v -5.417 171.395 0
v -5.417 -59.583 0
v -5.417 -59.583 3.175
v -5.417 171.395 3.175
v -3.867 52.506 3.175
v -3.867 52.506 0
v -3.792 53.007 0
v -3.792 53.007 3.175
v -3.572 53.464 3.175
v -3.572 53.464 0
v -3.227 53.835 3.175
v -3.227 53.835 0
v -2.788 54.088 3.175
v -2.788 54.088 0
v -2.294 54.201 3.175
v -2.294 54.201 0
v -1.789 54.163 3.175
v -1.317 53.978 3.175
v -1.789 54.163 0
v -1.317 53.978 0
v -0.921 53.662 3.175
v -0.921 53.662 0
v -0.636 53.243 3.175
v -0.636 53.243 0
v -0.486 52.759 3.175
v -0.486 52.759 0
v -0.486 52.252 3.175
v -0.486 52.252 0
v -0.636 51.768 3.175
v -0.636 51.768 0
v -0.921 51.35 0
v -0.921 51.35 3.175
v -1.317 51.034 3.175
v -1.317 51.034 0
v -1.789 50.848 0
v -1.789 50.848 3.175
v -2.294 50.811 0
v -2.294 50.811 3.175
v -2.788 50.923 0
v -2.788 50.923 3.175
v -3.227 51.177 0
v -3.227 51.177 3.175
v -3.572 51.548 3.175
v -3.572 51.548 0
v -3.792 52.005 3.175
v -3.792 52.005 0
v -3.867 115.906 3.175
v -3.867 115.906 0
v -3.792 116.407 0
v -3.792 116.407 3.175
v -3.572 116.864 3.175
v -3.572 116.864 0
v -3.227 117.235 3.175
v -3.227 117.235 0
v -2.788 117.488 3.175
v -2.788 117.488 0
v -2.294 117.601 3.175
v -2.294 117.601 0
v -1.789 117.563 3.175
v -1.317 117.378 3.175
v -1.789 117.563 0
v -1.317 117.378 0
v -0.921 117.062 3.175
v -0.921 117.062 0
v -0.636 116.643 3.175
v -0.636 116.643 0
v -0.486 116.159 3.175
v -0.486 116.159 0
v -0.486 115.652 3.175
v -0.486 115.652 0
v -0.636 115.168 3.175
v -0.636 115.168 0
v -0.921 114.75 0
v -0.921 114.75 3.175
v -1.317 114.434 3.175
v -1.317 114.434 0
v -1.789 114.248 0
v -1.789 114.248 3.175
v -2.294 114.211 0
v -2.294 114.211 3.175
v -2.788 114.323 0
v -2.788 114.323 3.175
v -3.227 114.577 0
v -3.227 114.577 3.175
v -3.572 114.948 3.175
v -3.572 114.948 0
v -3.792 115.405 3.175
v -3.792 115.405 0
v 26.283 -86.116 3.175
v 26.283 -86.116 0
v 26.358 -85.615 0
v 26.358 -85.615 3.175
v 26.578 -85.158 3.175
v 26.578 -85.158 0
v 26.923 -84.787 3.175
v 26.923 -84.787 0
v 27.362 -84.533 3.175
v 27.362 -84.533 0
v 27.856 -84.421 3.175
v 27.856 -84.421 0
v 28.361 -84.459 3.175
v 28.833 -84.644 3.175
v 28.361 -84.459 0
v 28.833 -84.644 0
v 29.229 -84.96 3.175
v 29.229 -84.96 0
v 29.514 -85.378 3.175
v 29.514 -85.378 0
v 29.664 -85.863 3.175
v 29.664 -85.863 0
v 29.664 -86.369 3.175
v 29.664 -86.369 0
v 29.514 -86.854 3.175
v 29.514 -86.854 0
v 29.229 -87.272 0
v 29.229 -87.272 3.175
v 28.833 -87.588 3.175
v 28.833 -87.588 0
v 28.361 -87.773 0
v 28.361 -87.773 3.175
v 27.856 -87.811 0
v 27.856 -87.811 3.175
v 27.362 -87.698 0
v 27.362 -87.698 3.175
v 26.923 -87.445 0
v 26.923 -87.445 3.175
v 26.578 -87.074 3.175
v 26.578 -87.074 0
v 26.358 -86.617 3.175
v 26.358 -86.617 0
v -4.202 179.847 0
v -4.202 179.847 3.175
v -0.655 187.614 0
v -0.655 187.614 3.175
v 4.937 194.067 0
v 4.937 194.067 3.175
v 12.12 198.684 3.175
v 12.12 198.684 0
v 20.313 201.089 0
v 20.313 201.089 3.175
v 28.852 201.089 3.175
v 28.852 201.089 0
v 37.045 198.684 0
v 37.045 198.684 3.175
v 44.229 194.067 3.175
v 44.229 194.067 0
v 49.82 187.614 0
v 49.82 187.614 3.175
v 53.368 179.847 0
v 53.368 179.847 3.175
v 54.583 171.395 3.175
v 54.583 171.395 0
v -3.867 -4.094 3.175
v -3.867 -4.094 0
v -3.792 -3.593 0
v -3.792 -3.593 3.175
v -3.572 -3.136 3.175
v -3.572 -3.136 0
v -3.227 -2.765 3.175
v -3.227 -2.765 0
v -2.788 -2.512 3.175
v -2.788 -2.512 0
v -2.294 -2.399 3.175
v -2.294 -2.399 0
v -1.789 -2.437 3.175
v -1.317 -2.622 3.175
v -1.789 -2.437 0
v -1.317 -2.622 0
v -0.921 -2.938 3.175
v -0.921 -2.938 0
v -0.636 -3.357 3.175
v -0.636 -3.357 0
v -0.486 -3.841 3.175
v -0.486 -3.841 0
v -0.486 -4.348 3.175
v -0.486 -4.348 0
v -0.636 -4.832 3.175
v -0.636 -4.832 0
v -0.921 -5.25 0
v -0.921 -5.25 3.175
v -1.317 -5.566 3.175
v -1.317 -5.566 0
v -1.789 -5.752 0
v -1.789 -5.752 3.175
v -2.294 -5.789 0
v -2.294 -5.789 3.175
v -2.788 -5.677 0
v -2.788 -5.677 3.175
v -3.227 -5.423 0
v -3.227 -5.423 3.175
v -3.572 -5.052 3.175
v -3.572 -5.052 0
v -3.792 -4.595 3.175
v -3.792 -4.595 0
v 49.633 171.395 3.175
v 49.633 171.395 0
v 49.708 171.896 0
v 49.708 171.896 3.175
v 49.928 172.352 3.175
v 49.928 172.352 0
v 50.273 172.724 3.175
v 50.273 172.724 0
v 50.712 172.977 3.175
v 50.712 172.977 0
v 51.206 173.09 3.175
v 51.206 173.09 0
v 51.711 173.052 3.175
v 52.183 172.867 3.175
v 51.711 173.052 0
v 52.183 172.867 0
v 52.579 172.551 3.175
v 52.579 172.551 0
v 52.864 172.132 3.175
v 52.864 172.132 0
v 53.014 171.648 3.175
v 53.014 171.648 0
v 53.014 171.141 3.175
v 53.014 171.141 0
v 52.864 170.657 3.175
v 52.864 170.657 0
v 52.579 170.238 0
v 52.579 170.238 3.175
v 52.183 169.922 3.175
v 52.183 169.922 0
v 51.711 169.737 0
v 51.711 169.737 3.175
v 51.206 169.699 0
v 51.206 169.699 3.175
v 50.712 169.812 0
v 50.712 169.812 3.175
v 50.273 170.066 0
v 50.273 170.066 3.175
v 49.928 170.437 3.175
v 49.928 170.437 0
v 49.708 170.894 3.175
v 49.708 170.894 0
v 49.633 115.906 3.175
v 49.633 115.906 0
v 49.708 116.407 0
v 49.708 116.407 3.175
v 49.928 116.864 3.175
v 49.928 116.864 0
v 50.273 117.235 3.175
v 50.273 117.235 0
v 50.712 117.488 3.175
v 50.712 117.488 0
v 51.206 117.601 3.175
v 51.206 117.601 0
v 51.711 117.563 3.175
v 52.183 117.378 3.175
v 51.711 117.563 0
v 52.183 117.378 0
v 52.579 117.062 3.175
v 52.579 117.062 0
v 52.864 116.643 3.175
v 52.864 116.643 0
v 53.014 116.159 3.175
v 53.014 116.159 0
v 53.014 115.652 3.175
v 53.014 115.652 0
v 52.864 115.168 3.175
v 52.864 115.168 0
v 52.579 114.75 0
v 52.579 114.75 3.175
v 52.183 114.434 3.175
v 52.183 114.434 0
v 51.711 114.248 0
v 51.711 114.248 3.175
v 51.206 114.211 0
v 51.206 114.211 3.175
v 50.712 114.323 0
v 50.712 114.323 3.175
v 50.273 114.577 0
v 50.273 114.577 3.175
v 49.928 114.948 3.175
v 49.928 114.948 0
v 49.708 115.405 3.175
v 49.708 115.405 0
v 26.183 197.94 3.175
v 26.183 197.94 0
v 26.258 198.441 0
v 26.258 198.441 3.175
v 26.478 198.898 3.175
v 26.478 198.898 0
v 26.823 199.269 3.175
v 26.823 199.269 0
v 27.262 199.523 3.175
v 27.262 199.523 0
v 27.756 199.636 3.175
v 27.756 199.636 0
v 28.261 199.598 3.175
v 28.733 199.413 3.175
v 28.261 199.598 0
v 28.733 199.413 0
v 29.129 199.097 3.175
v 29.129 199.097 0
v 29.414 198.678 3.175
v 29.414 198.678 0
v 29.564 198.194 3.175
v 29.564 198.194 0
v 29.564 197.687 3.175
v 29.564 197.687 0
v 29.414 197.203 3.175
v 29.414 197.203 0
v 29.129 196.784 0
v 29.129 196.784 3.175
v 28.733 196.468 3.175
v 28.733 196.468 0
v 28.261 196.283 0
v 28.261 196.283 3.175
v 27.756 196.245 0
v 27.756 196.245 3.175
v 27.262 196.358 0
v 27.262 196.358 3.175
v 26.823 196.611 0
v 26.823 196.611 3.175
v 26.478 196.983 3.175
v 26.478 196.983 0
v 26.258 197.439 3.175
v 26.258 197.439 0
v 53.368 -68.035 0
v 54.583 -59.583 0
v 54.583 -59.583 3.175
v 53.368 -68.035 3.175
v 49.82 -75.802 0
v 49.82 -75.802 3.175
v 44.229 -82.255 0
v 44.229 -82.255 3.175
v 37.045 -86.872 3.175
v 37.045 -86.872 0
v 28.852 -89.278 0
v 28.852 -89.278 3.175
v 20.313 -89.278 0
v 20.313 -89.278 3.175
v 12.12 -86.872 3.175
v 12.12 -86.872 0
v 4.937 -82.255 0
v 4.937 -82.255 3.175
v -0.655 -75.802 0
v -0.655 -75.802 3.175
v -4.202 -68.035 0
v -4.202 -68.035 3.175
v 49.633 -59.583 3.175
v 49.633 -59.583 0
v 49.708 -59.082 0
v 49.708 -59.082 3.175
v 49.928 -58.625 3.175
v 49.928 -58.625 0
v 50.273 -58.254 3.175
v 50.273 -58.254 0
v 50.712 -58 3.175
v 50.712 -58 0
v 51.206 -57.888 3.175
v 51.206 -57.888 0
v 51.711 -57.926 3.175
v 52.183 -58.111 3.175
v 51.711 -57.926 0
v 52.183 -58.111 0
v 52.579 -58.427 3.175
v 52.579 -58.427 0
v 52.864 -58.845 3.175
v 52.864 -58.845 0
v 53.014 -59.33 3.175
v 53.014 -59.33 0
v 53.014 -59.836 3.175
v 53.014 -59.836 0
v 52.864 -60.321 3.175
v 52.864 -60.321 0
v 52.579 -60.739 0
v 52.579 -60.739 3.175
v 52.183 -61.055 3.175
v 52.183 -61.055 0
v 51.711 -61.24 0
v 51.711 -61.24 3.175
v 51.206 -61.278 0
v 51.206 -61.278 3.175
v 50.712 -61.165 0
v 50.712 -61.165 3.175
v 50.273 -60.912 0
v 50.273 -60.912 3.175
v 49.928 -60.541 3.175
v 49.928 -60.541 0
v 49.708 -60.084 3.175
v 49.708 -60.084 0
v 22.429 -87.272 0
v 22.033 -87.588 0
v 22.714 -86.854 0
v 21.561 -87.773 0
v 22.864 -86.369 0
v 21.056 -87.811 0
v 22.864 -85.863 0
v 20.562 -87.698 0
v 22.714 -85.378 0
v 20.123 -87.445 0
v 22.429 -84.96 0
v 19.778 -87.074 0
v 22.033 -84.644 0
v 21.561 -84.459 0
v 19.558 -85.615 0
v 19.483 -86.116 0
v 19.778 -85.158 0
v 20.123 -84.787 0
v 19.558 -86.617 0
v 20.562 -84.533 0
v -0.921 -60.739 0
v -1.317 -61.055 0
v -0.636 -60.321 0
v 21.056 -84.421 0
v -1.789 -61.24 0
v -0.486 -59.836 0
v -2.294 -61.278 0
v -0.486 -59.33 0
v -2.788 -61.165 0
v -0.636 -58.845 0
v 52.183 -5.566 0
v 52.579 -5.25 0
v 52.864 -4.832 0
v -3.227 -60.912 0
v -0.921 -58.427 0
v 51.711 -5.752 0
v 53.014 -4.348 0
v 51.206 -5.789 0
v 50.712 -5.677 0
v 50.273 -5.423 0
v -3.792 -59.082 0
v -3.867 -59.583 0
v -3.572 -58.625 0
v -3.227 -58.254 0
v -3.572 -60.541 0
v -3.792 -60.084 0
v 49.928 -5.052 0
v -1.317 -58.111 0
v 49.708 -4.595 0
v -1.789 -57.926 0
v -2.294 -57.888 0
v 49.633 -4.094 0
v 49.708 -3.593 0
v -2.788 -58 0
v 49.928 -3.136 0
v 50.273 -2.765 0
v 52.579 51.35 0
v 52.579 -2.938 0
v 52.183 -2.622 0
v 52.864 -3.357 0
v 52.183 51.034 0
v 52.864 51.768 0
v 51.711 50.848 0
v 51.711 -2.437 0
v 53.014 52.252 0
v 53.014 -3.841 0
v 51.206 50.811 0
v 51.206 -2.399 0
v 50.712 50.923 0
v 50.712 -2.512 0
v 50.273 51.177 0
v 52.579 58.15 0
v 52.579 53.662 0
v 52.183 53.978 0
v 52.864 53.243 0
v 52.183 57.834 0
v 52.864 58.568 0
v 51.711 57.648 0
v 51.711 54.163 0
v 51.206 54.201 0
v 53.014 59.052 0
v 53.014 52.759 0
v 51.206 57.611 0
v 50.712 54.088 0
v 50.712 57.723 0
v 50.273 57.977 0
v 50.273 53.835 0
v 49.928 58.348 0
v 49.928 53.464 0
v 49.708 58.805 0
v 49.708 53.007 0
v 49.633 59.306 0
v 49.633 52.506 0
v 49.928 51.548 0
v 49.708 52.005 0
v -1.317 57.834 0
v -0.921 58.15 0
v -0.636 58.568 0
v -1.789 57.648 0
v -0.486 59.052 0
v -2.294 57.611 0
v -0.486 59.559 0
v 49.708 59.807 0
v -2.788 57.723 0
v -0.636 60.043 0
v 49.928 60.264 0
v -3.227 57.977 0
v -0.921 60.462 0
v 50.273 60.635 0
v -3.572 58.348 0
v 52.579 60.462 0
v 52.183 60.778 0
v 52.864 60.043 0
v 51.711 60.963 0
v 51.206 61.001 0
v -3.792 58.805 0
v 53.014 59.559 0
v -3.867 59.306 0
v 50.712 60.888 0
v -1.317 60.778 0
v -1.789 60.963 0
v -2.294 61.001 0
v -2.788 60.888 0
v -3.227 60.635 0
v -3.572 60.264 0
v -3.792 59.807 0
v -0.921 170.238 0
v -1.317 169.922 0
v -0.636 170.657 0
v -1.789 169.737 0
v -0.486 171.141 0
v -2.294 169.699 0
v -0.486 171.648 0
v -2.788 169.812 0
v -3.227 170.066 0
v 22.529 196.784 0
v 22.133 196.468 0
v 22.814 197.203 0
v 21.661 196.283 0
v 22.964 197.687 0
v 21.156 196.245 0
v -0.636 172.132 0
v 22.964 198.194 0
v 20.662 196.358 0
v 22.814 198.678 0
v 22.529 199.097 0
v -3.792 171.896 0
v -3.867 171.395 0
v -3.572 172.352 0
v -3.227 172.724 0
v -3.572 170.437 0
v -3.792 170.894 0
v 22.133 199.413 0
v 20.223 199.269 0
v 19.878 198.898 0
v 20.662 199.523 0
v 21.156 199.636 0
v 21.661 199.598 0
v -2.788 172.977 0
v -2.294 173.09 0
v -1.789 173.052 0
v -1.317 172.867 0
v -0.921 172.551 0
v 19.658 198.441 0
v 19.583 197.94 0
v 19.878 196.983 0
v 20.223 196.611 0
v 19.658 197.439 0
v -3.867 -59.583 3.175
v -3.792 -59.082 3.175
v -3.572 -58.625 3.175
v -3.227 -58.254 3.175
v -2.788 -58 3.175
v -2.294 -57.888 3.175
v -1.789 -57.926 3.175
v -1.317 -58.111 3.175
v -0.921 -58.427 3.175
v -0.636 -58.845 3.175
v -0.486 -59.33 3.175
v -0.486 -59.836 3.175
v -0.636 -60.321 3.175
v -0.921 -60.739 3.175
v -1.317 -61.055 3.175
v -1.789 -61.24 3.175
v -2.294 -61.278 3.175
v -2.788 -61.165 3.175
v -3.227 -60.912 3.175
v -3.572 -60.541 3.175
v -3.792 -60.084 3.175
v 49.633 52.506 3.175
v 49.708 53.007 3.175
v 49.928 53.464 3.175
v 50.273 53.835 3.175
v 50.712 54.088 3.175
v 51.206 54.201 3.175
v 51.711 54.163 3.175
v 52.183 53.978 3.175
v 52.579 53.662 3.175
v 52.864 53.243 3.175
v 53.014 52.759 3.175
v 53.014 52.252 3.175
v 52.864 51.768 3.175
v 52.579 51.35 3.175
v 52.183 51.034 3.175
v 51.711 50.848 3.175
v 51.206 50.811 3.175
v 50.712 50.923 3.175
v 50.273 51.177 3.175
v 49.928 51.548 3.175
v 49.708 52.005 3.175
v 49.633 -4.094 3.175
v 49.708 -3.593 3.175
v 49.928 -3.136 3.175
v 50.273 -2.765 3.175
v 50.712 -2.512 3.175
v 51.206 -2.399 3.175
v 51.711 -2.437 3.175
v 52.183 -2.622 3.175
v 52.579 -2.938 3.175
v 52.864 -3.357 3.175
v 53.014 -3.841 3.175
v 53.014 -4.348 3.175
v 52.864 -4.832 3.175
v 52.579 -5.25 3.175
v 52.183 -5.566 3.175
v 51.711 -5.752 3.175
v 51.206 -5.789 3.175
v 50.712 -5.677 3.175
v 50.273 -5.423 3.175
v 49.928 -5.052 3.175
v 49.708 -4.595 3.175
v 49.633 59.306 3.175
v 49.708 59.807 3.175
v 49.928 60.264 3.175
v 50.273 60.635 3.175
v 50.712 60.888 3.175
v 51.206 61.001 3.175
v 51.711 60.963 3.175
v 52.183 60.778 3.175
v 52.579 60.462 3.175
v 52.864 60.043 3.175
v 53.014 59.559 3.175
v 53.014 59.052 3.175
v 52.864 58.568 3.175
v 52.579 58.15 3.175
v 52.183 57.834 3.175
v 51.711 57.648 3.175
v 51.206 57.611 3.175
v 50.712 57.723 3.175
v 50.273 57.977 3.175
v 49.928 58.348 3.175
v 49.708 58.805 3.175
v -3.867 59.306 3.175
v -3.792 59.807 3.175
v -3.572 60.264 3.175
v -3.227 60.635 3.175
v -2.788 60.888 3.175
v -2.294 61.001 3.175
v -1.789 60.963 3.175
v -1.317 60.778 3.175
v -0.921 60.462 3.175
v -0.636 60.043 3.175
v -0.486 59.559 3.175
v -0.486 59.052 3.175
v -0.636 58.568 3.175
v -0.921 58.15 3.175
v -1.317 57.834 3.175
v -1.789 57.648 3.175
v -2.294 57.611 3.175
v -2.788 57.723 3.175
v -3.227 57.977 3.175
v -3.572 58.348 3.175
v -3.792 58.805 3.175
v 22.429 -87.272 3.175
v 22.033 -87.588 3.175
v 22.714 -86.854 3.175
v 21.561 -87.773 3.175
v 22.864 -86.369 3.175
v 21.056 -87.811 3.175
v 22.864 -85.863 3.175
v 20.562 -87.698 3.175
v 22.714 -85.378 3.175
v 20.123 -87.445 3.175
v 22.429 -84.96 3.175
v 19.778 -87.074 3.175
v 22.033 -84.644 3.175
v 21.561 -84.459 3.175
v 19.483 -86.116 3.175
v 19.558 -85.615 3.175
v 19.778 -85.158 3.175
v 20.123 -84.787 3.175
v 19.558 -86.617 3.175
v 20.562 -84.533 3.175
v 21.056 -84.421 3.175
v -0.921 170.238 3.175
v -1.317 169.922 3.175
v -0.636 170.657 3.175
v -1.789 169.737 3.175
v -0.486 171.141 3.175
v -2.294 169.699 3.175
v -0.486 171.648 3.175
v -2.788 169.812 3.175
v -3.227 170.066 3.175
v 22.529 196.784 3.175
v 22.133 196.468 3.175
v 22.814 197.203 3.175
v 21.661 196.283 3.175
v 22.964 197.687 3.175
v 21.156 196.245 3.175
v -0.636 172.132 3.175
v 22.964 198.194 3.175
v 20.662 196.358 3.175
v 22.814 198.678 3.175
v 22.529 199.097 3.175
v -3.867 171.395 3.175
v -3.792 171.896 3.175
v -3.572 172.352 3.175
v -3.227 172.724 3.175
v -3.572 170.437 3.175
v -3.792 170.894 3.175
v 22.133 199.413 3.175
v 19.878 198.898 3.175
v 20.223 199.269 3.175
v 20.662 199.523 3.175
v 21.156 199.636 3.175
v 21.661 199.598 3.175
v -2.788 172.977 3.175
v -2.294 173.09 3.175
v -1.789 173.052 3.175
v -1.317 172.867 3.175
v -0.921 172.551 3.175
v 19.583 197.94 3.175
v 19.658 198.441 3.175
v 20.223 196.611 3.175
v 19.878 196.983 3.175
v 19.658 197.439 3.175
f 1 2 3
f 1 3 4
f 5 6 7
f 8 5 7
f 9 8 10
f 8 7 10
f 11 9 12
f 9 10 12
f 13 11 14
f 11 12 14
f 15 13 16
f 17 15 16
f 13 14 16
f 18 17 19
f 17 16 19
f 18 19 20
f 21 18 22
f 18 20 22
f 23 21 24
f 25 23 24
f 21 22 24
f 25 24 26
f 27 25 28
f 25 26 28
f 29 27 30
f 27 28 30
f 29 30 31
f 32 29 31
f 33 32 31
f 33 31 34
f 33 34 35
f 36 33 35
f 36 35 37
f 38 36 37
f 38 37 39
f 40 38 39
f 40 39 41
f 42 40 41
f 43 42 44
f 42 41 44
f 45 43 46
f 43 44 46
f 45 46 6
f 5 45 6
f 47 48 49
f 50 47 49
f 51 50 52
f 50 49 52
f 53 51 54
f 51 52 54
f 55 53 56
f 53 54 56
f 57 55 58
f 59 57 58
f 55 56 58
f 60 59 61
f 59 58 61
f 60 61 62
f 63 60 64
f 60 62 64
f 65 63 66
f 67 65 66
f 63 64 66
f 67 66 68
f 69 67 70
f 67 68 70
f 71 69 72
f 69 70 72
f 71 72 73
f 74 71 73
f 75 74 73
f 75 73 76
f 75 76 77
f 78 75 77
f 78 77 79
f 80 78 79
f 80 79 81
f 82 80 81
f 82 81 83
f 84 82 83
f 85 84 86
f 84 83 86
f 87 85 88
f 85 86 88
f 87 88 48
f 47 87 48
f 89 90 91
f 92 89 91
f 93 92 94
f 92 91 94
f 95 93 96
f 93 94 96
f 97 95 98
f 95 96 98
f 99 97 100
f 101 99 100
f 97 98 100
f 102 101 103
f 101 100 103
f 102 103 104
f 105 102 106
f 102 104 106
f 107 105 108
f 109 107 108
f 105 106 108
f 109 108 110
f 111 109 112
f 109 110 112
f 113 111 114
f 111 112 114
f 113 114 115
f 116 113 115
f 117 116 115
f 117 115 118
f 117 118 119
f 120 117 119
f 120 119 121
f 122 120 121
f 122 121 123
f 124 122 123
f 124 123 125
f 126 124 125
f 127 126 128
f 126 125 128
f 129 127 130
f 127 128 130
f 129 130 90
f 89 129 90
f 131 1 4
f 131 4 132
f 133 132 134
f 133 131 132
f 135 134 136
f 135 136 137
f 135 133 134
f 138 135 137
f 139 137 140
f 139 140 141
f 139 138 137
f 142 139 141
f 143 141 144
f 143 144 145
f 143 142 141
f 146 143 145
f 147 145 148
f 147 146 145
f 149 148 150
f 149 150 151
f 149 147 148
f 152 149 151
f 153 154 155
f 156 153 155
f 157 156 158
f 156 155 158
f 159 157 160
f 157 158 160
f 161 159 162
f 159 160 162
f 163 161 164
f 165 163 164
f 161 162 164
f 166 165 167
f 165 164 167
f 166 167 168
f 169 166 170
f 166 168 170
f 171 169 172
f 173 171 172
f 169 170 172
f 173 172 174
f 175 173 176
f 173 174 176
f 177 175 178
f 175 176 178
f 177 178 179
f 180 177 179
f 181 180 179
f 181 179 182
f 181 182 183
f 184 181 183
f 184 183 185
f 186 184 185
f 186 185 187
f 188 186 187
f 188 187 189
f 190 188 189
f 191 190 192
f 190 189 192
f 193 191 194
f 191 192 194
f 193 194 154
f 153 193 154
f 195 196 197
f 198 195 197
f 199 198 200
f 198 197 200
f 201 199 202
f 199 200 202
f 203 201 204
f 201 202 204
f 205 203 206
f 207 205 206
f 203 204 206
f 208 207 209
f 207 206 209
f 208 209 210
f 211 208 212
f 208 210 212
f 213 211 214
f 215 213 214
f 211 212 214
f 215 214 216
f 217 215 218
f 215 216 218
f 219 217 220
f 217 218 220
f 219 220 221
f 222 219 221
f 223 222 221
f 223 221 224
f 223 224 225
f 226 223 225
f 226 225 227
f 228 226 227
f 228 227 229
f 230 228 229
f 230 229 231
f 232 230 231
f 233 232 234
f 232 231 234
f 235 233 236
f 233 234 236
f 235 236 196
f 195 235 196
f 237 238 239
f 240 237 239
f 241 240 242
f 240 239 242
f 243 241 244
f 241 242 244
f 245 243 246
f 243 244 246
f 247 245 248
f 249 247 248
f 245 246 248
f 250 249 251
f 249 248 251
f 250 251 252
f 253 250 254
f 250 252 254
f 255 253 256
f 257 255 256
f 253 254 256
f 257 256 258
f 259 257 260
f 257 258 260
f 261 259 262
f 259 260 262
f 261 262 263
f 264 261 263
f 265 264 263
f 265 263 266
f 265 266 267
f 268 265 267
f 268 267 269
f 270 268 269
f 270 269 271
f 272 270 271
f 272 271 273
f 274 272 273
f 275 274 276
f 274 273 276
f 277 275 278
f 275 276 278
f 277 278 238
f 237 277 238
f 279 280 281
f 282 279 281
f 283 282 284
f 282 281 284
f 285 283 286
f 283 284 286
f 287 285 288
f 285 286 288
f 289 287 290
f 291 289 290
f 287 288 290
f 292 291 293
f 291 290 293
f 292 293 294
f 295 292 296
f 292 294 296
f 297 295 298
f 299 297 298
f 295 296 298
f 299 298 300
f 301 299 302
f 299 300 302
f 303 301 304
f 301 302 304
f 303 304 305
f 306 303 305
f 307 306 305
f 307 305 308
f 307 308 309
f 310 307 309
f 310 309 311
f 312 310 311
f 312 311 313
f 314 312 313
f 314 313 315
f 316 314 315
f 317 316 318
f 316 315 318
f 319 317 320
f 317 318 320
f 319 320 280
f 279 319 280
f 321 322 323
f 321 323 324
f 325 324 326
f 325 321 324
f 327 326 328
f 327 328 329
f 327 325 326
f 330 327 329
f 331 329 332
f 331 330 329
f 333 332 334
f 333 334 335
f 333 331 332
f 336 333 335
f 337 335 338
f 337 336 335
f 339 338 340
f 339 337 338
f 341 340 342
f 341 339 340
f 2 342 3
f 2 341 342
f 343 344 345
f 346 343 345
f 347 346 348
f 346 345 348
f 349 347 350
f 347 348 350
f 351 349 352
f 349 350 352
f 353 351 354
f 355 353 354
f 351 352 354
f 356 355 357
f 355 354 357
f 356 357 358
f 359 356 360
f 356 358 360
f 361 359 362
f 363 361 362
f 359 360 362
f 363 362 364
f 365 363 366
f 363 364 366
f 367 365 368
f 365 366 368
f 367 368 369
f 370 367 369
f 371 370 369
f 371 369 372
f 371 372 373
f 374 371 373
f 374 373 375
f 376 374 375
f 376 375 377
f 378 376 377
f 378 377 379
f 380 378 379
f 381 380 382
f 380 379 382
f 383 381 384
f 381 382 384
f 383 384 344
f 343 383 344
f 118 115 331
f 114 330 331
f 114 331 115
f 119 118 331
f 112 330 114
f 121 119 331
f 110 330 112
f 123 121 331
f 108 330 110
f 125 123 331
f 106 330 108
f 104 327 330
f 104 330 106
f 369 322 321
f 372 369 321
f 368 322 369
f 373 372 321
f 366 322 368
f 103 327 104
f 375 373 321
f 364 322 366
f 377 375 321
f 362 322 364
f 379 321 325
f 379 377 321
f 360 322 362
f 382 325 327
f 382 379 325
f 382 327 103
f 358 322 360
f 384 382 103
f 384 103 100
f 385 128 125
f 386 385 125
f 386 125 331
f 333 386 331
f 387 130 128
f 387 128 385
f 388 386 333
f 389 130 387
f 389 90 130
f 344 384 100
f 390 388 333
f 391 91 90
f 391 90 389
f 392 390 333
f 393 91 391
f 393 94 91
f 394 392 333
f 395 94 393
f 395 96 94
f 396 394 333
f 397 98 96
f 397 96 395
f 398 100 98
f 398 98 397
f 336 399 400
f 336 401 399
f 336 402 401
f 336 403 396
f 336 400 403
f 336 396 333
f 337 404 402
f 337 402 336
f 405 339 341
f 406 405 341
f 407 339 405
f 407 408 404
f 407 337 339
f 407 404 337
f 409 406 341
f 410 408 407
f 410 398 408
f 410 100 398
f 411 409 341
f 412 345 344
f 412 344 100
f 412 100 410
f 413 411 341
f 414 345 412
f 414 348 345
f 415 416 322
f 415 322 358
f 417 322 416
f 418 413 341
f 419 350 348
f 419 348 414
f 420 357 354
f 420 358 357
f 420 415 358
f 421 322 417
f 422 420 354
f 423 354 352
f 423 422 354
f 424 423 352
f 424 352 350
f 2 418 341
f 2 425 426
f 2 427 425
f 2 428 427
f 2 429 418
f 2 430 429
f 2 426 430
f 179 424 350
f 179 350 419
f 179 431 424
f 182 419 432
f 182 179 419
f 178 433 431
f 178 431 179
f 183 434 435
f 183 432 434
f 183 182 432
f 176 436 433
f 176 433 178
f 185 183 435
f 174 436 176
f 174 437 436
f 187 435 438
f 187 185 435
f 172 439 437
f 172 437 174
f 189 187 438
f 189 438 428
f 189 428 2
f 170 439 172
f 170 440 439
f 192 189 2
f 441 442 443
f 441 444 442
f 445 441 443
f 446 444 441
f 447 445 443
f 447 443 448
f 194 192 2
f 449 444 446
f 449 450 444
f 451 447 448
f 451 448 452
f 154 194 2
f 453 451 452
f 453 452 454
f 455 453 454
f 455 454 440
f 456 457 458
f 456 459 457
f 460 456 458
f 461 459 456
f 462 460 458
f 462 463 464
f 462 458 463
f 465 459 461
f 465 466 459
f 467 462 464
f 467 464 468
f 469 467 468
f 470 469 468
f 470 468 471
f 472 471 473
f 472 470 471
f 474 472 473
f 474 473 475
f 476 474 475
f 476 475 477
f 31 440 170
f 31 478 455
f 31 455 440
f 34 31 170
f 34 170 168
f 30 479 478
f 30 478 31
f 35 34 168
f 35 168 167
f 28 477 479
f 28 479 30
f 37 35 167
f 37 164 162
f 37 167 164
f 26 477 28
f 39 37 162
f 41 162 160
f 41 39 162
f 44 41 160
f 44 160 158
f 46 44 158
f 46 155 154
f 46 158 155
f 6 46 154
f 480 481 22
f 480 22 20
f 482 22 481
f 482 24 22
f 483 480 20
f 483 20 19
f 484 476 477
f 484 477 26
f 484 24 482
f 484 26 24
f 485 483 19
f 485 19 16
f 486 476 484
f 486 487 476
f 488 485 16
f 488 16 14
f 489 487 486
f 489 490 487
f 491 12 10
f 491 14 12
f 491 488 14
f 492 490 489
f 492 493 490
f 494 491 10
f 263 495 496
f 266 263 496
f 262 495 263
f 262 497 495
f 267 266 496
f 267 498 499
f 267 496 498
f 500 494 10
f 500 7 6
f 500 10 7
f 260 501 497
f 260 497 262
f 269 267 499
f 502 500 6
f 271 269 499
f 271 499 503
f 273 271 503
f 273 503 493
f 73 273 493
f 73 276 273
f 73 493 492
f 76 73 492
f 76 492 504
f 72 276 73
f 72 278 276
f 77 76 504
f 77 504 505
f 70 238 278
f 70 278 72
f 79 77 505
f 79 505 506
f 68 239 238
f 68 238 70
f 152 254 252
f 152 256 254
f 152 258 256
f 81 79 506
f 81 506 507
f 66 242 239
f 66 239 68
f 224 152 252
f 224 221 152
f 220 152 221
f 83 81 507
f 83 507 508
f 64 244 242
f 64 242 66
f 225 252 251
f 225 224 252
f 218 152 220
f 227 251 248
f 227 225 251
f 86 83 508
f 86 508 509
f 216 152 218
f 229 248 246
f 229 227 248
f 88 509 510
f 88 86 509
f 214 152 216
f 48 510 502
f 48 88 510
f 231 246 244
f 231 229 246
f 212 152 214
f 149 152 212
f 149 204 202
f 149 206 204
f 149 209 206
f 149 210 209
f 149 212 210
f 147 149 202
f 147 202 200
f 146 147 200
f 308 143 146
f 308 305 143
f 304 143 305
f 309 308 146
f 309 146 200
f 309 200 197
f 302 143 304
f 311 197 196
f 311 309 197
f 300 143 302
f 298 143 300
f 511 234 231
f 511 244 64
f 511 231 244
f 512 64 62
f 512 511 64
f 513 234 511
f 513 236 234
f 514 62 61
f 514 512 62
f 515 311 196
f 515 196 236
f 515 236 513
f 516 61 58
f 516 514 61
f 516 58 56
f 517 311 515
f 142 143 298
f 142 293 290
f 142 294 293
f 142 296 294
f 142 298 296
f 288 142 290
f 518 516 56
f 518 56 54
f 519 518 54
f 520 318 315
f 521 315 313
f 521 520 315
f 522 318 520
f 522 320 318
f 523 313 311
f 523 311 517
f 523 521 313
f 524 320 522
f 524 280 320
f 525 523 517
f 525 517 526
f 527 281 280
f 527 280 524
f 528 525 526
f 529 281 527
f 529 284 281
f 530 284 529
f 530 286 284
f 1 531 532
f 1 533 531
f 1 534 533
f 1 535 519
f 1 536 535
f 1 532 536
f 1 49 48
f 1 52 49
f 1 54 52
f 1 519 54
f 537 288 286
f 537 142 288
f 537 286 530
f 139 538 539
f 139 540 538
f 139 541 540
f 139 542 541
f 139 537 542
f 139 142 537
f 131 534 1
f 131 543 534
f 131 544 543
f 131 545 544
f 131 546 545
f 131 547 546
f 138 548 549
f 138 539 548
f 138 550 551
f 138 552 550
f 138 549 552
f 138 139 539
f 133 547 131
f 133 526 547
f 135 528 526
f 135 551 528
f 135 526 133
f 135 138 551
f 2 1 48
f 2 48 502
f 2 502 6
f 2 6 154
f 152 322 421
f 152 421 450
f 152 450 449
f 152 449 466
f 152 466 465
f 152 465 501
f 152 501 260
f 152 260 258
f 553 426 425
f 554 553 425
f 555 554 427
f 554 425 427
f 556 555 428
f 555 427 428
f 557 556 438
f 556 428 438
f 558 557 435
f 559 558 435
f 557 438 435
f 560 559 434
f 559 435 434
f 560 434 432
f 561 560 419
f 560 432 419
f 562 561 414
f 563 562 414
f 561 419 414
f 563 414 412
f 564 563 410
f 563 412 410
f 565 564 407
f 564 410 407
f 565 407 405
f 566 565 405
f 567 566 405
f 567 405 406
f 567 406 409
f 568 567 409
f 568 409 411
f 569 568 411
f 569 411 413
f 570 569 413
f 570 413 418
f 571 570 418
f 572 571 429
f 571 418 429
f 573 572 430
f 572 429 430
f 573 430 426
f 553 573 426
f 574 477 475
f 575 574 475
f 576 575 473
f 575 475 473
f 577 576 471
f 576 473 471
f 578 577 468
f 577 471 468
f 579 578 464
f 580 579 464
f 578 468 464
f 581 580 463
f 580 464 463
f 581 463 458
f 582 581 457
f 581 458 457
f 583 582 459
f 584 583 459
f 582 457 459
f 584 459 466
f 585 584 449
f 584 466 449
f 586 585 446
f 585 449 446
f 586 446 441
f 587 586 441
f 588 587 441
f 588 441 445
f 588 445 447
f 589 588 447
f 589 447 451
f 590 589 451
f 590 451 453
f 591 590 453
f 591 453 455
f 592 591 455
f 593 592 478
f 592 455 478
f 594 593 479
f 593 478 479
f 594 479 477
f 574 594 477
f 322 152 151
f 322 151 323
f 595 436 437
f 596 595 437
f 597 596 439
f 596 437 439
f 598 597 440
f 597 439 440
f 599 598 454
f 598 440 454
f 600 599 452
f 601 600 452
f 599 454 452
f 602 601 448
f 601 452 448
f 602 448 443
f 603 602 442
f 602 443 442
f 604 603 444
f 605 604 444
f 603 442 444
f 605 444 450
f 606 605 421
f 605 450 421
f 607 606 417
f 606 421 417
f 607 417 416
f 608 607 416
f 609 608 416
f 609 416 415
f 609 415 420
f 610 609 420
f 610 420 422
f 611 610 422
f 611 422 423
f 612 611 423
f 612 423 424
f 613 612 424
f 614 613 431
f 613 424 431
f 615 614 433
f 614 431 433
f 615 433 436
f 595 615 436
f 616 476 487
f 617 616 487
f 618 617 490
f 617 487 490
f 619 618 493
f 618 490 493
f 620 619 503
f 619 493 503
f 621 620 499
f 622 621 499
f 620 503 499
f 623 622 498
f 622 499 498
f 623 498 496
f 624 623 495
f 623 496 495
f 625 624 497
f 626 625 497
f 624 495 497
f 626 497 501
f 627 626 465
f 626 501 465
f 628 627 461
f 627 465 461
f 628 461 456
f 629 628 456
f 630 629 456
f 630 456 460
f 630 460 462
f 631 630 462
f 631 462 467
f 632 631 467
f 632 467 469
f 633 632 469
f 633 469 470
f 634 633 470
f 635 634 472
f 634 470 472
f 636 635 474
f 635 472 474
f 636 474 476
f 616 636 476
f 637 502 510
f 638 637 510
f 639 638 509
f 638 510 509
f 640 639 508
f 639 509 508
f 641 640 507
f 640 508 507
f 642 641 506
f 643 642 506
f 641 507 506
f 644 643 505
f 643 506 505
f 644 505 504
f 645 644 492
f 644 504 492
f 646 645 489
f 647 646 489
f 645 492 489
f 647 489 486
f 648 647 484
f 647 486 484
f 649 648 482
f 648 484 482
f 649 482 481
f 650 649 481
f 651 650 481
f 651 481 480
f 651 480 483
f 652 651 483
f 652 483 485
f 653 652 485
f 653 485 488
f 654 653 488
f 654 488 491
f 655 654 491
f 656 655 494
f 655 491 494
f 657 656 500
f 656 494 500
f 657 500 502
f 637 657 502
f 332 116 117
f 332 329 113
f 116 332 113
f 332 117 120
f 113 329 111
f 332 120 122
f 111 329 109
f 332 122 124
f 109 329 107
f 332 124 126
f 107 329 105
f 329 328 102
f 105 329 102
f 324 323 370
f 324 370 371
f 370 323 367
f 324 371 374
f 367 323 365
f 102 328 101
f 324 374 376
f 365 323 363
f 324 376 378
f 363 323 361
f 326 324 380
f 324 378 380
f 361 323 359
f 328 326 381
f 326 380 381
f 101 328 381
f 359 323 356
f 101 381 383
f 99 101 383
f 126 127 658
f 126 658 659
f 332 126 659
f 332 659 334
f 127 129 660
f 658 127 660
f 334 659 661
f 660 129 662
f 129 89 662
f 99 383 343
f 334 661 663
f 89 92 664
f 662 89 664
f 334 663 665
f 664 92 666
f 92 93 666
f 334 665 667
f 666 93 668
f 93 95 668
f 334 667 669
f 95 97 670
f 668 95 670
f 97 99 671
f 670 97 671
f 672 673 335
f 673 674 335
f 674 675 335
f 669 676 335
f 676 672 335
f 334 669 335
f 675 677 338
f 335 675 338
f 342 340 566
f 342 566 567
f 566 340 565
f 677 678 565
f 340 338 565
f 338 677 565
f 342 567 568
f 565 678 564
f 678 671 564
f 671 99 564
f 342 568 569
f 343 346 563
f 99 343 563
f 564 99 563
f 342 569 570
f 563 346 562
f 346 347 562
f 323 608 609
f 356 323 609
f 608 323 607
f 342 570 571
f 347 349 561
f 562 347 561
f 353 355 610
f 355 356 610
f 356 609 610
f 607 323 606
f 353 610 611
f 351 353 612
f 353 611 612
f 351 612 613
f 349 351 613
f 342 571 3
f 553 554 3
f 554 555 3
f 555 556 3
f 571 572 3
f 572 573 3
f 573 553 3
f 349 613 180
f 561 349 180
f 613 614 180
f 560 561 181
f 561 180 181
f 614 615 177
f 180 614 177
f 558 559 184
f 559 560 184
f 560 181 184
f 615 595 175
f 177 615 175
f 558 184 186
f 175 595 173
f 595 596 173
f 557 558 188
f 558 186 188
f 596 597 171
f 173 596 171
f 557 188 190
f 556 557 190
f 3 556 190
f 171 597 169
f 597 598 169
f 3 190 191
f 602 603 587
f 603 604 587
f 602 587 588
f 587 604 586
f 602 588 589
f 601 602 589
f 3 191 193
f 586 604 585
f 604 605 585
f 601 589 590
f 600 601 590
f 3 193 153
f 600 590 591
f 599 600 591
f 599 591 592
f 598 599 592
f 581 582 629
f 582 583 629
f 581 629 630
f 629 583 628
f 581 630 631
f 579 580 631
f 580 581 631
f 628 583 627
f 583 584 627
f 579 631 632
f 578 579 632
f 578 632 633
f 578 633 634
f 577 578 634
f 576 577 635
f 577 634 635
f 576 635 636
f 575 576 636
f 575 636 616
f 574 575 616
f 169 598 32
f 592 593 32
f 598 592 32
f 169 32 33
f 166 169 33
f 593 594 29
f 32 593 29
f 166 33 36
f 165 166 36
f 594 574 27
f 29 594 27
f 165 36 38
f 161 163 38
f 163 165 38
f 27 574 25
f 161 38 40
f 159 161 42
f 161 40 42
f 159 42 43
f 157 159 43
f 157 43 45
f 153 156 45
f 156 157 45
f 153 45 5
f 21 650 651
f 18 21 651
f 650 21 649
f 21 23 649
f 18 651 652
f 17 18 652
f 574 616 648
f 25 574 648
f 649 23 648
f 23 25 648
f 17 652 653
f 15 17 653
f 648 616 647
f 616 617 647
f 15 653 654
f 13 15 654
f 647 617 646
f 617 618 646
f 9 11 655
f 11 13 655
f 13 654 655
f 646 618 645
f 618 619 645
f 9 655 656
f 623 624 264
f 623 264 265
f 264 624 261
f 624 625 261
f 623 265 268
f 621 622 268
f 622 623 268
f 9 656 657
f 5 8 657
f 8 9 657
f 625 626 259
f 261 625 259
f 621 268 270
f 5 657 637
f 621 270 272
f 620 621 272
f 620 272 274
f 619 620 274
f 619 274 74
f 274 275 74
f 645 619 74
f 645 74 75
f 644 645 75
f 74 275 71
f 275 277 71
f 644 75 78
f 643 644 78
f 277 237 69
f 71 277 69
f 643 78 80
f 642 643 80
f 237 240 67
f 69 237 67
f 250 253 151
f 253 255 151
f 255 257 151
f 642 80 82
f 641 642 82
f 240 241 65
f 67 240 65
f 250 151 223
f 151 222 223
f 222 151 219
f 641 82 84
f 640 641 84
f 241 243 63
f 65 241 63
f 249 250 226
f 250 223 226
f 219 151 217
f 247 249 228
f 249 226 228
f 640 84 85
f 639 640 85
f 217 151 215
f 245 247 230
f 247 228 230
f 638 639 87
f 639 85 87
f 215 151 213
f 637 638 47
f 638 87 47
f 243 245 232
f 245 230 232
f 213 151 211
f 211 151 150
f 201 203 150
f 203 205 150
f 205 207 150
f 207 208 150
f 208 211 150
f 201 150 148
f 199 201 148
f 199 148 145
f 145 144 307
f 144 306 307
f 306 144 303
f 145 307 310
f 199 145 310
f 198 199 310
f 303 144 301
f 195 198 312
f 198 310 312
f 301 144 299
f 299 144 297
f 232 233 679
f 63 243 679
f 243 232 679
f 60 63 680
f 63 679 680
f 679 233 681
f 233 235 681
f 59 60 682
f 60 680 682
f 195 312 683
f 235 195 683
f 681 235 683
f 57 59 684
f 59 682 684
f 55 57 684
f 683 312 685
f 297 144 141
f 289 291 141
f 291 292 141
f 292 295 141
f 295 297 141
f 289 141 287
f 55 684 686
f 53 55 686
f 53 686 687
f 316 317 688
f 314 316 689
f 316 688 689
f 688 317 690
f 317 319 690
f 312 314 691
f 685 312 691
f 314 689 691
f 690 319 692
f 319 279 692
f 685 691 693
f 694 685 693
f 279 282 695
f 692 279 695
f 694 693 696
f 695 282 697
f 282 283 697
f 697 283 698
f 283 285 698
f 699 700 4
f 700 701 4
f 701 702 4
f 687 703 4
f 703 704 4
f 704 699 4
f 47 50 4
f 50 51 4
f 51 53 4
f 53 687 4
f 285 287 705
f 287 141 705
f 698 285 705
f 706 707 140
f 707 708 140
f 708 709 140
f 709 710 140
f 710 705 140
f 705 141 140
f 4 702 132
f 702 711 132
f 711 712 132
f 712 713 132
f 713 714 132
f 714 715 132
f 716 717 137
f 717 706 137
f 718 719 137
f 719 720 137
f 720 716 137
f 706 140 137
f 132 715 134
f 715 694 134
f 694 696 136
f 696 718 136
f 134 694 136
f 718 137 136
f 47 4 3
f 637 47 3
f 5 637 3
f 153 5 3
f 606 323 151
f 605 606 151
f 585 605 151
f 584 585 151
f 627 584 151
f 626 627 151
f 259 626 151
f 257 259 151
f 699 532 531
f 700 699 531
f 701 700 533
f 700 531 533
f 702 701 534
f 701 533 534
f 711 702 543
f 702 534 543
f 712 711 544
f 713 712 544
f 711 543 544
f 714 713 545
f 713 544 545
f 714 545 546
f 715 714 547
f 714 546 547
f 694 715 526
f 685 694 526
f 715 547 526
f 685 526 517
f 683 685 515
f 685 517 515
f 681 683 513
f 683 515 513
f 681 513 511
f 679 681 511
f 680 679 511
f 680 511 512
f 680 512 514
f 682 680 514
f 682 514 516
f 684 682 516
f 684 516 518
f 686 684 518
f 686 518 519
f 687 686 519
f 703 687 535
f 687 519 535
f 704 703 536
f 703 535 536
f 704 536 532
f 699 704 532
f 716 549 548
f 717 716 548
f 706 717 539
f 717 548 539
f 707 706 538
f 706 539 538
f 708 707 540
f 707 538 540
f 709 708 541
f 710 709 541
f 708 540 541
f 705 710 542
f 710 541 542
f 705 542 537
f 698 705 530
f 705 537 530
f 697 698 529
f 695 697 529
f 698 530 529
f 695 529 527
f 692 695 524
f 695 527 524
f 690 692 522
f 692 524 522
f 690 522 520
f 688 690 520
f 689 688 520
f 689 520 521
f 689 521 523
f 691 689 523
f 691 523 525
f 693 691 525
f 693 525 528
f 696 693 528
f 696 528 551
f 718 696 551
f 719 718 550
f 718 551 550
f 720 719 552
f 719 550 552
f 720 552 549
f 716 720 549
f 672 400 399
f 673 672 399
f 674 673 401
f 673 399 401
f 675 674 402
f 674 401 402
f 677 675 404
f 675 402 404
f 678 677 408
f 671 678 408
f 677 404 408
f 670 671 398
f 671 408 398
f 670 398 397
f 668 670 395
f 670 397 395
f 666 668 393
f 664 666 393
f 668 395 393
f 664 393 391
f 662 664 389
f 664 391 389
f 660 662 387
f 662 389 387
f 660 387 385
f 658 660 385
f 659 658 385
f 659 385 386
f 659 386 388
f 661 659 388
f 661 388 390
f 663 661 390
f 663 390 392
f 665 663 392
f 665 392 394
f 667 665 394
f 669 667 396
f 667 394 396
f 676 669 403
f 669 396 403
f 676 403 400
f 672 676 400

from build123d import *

# Parameters (mm, degrees)
SKETCH1_R           = 1.7
BOSS_EXTRUDE1_DEPTH = 3.175


with BuildPart() as part:
    # Sketch1 → Boss-Extrude1 (new body)
    with BuildSketch(Plane(origin=(0, 0, 0), x_dir=(-1, 0, 0), z_dir=(0, 0, -1))):
        with BuildLine():
            Line((5.417282063, -59.58290593), (5.417282063, 171.394622999))
            ThreePointArc((5.417282063, 171.394622999), (-24.582717937, 201.394622999), (-54.582717937, 171.394622999))
            Line((-54.582717937, 171.394622999), (-54.582717937, -59.58290593))
            ThreePointArc((-54.582717937, -59.58290593), (-24.582717937, -89.58290593), (5.417282063, -59.58290593))
        make_face()
        with Locations((2.167282063, 52.505858535)):
            Circle(SKETCH1_R, mode=Mode.SUBTRACT)
        with Locations((-51.332717937, 59.305858535)):
            Circle(SKETCH1_R, mode=Mode.SUBTRACT)
        with Locations((-51.332717937, 52.505858535)):
            Circle(SKETCH1_R, mode=Mode.SUBTRACT)
        with Locations((-21.282717937, 197.940291196)):
            Circle(SKETCH1_R, mode=Mode.SUBTRACT)
        with Locations((2.167282063, -4.094141465)):
            Circle(SKETCH1_R, mode=Mode.SUBTRACT)
        with Locations((-51.332717937, -4.094141465)):
            Circle(SKETCH1_R, mode=Mode.SUBTRACT)
        with Locations((-51.332717937, -59.58290593)):
            Circle(SKETCH1_R, mode=Mode.SUBTRACT)
        with Locations((2.167282063, 115.905858535)):
            Circle(SKETCH1_R, mode=Mode.SUBTRACT)
        with Locations((-51.332717937, 115.905858535)):
            Circle(SKETCH1_R, mode=Mode.SUBTRACT)
        with Locations((2.167282063, 171.394622999)):
            Circle(SKETCH1_R, mode=Mode.SUBTRACT)
        with Locations((-27.982717937, -86.115951364)):
            Circle(SKETCH1_R, mode=Mode.SUBTRACT)
        with Locations((2.167282063, 59.305858535)):
            Circle(SKETCH1_R, mode=Mode.SUBTRACT)
        with Locations((-51.332717937, 171.394622999)):
            Circle(SKETCH1_R, mode=Mode.SUBTRACT)
        with Locations((-21.182717937, -86.115951364)):
            Circle(SKETCH1_R, mode=Mode.SUBTRACT)
        with Locations((2.167282063, -59.58290593)):
            Circle(SKETCH1_R, mode=Mode.SUBTRACT)
        with Locations((-27.882717937, 197.940291196)):
            Circle(SKETCH1_R, mode=Mode.SUBTRACT)
    extrude(amount=-BOSS_EXTRUDE1_DEPTH)


solid = part.part
